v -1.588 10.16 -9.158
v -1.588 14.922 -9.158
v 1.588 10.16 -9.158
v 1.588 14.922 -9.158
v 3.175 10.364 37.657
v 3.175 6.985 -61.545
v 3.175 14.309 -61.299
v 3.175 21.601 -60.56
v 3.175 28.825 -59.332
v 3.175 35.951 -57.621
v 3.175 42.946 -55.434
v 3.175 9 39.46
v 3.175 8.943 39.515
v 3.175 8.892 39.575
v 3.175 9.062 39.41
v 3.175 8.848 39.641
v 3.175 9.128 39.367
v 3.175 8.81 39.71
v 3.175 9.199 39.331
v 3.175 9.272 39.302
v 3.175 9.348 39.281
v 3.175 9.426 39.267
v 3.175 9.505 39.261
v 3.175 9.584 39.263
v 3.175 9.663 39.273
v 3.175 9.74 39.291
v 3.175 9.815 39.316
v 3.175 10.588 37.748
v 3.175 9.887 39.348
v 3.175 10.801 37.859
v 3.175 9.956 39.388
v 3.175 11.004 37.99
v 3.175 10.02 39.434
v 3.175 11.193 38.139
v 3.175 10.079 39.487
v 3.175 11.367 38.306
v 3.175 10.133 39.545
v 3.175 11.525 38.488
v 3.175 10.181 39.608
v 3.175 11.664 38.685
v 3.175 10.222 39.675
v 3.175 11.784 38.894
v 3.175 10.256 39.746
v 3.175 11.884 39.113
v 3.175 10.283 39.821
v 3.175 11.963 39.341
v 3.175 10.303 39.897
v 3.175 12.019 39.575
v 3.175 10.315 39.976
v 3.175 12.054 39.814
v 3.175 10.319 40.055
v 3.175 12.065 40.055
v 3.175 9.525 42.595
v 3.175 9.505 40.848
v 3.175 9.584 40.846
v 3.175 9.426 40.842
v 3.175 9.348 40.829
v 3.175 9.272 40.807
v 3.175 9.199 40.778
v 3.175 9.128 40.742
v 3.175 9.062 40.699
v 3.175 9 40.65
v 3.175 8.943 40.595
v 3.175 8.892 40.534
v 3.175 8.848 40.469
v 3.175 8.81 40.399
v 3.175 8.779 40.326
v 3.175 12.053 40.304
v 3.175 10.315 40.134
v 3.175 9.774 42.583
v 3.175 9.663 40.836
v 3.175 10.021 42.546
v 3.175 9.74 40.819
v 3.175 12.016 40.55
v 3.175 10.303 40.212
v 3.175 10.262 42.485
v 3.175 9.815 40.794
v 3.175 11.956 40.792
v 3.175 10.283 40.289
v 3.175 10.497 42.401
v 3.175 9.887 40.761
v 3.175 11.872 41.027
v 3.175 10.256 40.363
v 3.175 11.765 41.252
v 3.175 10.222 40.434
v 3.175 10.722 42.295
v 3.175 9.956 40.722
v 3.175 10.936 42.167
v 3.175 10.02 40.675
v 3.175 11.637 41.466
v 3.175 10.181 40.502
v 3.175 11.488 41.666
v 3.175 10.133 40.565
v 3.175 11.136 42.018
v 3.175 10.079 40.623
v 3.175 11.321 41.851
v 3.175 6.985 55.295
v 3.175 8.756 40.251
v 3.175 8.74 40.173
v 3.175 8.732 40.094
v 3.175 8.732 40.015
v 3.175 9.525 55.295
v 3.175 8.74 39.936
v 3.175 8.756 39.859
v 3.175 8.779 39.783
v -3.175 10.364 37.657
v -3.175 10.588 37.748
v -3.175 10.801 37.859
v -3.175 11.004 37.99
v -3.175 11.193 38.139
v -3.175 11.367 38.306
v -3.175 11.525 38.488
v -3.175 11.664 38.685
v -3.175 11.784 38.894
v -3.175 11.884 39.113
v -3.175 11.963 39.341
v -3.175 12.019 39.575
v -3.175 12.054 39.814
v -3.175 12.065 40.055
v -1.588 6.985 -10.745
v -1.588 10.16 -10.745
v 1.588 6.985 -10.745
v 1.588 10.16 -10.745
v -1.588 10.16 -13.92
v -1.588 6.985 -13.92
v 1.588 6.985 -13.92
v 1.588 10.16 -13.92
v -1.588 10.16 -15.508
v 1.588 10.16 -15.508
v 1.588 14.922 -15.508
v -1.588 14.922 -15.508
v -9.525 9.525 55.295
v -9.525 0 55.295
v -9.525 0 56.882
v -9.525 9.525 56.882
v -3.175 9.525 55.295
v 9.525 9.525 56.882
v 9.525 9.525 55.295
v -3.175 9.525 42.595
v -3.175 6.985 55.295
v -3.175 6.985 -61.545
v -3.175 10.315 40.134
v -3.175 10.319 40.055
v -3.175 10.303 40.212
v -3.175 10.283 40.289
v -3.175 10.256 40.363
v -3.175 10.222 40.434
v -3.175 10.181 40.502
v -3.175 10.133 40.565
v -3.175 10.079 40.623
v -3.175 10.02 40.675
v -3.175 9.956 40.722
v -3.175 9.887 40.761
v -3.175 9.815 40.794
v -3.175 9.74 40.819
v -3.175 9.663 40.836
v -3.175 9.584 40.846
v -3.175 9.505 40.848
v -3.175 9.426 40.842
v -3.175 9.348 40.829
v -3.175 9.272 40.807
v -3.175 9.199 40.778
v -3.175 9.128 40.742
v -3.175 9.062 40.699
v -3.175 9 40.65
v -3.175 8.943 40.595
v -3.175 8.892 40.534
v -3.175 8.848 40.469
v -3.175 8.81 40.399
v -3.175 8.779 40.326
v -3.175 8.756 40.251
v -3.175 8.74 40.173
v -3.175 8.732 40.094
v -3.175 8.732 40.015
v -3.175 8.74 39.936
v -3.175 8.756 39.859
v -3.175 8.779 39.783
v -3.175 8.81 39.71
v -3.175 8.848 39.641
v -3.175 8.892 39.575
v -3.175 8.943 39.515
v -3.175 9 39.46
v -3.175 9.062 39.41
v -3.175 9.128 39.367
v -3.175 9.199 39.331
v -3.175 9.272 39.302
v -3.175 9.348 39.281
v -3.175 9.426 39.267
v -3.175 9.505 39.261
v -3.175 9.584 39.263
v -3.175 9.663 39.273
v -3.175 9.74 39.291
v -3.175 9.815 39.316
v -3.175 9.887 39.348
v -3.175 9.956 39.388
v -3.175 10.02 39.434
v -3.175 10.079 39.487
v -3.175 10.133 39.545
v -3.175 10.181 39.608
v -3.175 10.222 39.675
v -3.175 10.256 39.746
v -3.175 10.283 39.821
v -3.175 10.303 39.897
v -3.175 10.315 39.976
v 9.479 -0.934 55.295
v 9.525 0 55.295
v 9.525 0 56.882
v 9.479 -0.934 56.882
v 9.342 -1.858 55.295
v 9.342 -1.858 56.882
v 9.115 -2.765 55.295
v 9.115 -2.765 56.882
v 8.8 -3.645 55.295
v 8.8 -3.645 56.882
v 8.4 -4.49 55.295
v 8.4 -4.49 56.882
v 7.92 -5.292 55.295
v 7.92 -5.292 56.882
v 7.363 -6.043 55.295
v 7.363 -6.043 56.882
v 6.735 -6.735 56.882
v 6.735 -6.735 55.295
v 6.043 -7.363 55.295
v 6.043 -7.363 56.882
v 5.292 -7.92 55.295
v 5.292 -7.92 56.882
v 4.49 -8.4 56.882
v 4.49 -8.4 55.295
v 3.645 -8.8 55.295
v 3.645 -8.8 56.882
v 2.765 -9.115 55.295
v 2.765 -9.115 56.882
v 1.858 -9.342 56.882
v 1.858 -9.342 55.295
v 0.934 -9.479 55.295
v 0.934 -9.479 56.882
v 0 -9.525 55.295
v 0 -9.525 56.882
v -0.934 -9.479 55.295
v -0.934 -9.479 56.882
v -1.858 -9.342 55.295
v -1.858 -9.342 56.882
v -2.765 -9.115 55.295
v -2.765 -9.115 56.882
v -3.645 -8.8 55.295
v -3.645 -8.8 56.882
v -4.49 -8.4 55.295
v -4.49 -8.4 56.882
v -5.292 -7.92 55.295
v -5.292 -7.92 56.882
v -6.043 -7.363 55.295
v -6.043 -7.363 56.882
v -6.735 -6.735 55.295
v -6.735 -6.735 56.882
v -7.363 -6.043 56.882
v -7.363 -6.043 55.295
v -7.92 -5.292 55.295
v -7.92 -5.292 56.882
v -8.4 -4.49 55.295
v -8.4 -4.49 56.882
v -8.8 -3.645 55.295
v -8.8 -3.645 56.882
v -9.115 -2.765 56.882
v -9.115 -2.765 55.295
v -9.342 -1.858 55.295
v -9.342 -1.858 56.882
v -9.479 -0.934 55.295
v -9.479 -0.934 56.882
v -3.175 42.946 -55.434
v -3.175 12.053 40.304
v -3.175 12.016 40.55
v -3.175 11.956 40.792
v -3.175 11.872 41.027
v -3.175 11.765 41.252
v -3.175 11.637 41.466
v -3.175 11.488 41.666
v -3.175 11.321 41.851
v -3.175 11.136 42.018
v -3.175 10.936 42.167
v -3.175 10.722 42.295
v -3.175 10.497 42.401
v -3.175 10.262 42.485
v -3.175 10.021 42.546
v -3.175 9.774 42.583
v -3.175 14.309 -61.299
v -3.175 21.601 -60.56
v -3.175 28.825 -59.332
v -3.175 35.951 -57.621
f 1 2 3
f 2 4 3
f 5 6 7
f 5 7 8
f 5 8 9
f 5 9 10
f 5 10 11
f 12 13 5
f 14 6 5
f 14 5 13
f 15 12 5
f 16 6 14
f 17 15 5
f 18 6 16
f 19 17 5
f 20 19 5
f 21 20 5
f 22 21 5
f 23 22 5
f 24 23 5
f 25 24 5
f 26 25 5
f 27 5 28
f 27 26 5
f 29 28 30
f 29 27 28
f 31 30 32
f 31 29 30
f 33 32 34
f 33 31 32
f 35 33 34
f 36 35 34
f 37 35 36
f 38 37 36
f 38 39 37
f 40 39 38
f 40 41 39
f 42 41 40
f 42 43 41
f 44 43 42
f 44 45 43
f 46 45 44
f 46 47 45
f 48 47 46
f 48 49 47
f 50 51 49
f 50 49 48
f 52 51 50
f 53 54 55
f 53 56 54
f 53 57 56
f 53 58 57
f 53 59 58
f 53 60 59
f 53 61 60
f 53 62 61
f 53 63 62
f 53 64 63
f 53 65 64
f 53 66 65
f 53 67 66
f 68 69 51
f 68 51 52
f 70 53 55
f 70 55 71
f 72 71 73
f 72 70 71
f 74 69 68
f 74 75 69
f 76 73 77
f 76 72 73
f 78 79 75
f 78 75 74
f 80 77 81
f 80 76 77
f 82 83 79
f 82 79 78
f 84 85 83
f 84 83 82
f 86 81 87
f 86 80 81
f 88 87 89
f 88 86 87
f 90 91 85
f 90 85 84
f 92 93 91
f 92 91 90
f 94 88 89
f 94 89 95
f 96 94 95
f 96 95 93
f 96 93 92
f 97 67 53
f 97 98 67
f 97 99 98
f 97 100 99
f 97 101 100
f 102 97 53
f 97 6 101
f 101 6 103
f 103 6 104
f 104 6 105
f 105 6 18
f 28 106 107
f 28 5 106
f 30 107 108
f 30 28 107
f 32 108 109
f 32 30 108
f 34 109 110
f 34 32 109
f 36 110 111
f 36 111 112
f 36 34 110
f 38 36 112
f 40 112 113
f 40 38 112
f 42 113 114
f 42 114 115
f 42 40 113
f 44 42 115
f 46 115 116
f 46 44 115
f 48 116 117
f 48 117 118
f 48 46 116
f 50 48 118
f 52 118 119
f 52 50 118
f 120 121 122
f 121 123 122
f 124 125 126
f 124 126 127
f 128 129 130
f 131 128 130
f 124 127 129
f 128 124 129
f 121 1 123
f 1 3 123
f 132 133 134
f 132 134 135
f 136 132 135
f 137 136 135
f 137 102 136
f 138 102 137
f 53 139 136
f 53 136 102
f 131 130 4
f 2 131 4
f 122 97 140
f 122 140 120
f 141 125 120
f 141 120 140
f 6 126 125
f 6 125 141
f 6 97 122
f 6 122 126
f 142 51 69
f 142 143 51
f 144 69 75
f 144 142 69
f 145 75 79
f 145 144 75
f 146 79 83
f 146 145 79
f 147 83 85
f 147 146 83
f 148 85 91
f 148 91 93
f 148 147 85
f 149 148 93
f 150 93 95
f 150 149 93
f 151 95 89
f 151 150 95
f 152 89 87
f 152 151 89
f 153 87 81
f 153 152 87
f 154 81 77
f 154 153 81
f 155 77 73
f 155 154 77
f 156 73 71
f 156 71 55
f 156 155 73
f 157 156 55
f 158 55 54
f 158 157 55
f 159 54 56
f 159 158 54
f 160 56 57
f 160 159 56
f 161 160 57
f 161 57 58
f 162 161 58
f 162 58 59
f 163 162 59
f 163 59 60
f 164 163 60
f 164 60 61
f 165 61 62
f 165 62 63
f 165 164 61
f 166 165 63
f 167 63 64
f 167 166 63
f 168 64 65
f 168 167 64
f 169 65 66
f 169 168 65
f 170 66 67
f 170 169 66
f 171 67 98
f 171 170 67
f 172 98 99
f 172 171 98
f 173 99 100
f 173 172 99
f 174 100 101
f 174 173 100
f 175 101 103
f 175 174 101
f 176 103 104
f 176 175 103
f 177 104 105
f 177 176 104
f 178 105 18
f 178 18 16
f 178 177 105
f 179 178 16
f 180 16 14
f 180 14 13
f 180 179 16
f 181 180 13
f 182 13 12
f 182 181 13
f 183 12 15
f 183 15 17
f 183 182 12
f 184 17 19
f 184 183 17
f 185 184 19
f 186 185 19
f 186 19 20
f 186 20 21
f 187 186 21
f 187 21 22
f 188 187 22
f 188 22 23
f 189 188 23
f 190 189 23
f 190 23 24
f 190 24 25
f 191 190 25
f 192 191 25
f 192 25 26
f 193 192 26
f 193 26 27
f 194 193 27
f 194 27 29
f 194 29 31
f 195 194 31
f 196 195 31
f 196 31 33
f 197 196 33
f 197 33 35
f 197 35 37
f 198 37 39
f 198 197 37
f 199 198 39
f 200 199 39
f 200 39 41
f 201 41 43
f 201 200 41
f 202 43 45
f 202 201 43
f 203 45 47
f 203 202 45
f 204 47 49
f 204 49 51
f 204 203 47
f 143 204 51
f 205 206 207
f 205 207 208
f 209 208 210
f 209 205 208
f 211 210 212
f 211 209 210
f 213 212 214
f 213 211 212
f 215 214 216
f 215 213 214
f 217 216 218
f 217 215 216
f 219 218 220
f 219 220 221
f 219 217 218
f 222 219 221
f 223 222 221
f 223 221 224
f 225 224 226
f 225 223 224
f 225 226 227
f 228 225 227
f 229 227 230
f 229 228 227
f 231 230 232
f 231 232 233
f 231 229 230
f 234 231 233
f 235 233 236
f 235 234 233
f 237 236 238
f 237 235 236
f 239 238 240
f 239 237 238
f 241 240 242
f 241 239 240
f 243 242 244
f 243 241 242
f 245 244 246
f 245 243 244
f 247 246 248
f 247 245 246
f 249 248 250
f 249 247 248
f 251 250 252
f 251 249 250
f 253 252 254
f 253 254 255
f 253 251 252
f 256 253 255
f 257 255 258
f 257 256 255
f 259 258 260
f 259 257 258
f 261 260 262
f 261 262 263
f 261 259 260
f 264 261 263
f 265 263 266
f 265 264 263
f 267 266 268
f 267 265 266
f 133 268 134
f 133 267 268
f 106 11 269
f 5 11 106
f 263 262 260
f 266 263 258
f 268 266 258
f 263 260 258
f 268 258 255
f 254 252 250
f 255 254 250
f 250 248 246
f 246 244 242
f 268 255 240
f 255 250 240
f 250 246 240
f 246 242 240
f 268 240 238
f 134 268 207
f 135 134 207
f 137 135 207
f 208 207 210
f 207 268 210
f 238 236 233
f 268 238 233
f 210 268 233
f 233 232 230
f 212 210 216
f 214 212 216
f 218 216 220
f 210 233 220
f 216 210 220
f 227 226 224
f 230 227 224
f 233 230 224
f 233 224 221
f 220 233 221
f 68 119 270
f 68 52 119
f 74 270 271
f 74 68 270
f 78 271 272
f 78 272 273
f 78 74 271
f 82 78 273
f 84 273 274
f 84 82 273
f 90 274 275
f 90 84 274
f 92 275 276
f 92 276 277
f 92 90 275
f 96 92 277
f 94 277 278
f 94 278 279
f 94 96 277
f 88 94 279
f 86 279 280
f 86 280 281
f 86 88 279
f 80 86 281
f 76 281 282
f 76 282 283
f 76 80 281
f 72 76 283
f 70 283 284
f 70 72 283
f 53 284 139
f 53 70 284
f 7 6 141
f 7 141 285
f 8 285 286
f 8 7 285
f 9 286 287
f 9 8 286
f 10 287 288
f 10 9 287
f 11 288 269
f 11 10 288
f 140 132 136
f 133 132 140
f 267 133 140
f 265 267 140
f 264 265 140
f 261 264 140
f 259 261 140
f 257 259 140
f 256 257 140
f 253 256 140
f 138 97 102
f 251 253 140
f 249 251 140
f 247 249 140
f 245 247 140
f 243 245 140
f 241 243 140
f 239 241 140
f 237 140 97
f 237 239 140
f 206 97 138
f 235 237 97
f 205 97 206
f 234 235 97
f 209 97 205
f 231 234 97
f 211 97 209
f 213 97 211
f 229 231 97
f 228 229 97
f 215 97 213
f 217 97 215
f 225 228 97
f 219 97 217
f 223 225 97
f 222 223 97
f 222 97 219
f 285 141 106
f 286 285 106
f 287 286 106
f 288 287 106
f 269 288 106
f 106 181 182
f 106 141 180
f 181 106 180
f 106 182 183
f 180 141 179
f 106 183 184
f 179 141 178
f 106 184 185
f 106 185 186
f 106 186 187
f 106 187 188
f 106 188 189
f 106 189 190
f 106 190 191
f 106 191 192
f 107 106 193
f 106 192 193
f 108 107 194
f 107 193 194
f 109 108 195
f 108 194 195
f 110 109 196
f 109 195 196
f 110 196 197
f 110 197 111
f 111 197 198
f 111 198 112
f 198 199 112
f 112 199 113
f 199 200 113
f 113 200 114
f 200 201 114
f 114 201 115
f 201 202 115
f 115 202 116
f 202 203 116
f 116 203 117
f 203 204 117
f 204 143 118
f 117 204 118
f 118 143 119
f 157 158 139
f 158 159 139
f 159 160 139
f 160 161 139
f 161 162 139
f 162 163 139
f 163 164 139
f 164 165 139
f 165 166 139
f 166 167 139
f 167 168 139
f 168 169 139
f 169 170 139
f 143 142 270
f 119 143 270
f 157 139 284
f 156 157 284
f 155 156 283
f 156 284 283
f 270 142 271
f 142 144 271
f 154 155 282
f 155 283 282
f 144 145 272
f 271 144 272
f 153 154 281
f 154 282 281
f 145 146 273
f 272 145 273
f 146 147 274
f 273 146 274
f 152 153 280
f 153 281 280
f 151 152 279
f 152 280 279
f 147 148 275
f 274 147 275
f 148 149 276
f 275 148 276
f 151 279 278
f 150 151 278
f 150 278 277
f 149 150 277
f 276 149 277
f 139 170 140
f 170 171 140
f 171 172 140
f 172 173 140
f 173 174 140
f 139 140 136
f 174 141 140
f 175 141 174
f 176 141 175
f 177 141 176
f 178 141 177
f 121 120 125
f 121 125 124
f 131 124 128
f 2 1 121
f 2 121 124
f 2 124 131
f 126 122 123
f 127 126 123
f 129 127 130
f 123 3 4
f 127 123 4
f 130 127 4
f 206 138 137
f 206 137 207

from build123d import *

# Parameters (mm, degrees)
F3_DEPTH = 1.5875
F4_R     = 0.79375
F5_DEPTH = 3.175
F6_DEPTH = 1.5875


# Not quite as in the source:
# - a length typed as a fraction of an inch, garbled in the dataset ("3 / 203.2 mm" for 3/8 in), is restored


with BuildPart() as f3:
    # F2 (on line) → F3 (new body)
    with BuildSketch(Plane(origin=(0, 0, 55.2947693627), x_dir=(1, 0, 0), z_dir=(0, 0, -1))):
        with BuildLine():
            ThreePointArc((9.525, 0), (0, 9.525), (-9.525, 0))
            Line((-9.525, 0), (-9.525, -9.525))
            Line((-9.525, -9.525), (9.525, -9.525))
            Line((9.525, -9.525), (9.525, 0))
        make_face()
    extrude(amount=-F3_DEPTH)

    # F4 (on Right) → F5 (join, symmetric)
    with BuildSketch(Plane.YZ):
        with BuildLine():
            Line((9.525, 42.5947693627), (9.525, 55.2947693627))
            Line((9.525, 55.2947693627), (6.985, 55.2947693627))
            Line((6.985, 55.2947693627), (6.985, 40.0547693627))
            ThreePointArc((6.985, 40.0547693627), (7.7289487758, 41.8508205869), (9.525, 42.5947693627))
        make_face()
        Polygon((10.16, -10.7452306373), (6.985, -10.7452306373), (6.985, -13.9202306373), (10.16, -13.9202306373), (10.16, -15.5077306373), (14.9225, -15.5077306373), (14.9225, -9.1577306373), (10.16, -9.1577306373), align=None)
        with BuildLine():
            ThreePointArc((10.3640900788, 37.6573691375), (8.0552532191, 37.9831891928), (6.985, 40.0547693627))
            Line((6.985, 40.0547693627), (6.985, -10.7452306373))
            Line((6.985, -10.7452306373), (10.16, -10.7452306373))
            Line((10.16, -10.7452306373), (10.16, -9.1577306373))
            Line((10.16, -9.1577306373), (14.9225, -9.1577306373))
            Line((14.9225, -9.1577306373), (14.9225, -15.5077306373))
            Line((14.9225, -15.5077306373), (10.16, -15.5077306373))
            Line((10.16, -15.5077306373), (10.16, -13.9202306373))
            Line((10.16, -13.9202306373), (6.985, -13.9202306373))
            Line((6.985, -13.9202306373), (6.985, -61.5452306373))
            ThreePointArc((6.985, -61.5452306373), (25.2233058777, -60.0065006912), (42.9460033775, -55.433811716))
            Line((42.9460033775, -55.433811716), (10.3640900788, 37.6573691375))
        make_face()
        with BuildLine():
            ThreePointArc((12.065, 40.0547693627), (11.3210512242, 41.8508205869), (9.525, 42.5947693627))
            ThreePointArc((9.525, 42.5947693627), (7.7289487758, 41.8508205869), (6.985, 40.0547693627))
            ThreePointArc((6.985, 40.0547693627), (8.0552532191, 37.9831891928), (10.3640900788, 37.6573691375))
            ThreePointArc((10.3640900788, 37.6573691375), (11.5965801698, 38.5850225818), (12.065, 40.0547693627))
        make_face()
        with Locations((9.525, 40.0547693627)):
            Circle(F4_R, mode=Mode.SUBTRACT)
    extrude(amount=F5_DEPTH, both=True)

    # F4 (on Right) → F6 (cut, symmetric)
    with BuildSketch(Plane.YZ):
        Polygon((10.16, -10.7452306373), (6.985, -10.7452306373), (6.985, -13.9202306373), (10.16, -13.9202306373), (10.16, -15.5077306373), (14.9225, -15.5077306373), (14.9225, -9.1577306373), (10.16, -9.1577306373), align=None)
    extrude(amount=F6_DEPTH, both=True, mode=Mode.SUBTRACT)


solid = f3.part
